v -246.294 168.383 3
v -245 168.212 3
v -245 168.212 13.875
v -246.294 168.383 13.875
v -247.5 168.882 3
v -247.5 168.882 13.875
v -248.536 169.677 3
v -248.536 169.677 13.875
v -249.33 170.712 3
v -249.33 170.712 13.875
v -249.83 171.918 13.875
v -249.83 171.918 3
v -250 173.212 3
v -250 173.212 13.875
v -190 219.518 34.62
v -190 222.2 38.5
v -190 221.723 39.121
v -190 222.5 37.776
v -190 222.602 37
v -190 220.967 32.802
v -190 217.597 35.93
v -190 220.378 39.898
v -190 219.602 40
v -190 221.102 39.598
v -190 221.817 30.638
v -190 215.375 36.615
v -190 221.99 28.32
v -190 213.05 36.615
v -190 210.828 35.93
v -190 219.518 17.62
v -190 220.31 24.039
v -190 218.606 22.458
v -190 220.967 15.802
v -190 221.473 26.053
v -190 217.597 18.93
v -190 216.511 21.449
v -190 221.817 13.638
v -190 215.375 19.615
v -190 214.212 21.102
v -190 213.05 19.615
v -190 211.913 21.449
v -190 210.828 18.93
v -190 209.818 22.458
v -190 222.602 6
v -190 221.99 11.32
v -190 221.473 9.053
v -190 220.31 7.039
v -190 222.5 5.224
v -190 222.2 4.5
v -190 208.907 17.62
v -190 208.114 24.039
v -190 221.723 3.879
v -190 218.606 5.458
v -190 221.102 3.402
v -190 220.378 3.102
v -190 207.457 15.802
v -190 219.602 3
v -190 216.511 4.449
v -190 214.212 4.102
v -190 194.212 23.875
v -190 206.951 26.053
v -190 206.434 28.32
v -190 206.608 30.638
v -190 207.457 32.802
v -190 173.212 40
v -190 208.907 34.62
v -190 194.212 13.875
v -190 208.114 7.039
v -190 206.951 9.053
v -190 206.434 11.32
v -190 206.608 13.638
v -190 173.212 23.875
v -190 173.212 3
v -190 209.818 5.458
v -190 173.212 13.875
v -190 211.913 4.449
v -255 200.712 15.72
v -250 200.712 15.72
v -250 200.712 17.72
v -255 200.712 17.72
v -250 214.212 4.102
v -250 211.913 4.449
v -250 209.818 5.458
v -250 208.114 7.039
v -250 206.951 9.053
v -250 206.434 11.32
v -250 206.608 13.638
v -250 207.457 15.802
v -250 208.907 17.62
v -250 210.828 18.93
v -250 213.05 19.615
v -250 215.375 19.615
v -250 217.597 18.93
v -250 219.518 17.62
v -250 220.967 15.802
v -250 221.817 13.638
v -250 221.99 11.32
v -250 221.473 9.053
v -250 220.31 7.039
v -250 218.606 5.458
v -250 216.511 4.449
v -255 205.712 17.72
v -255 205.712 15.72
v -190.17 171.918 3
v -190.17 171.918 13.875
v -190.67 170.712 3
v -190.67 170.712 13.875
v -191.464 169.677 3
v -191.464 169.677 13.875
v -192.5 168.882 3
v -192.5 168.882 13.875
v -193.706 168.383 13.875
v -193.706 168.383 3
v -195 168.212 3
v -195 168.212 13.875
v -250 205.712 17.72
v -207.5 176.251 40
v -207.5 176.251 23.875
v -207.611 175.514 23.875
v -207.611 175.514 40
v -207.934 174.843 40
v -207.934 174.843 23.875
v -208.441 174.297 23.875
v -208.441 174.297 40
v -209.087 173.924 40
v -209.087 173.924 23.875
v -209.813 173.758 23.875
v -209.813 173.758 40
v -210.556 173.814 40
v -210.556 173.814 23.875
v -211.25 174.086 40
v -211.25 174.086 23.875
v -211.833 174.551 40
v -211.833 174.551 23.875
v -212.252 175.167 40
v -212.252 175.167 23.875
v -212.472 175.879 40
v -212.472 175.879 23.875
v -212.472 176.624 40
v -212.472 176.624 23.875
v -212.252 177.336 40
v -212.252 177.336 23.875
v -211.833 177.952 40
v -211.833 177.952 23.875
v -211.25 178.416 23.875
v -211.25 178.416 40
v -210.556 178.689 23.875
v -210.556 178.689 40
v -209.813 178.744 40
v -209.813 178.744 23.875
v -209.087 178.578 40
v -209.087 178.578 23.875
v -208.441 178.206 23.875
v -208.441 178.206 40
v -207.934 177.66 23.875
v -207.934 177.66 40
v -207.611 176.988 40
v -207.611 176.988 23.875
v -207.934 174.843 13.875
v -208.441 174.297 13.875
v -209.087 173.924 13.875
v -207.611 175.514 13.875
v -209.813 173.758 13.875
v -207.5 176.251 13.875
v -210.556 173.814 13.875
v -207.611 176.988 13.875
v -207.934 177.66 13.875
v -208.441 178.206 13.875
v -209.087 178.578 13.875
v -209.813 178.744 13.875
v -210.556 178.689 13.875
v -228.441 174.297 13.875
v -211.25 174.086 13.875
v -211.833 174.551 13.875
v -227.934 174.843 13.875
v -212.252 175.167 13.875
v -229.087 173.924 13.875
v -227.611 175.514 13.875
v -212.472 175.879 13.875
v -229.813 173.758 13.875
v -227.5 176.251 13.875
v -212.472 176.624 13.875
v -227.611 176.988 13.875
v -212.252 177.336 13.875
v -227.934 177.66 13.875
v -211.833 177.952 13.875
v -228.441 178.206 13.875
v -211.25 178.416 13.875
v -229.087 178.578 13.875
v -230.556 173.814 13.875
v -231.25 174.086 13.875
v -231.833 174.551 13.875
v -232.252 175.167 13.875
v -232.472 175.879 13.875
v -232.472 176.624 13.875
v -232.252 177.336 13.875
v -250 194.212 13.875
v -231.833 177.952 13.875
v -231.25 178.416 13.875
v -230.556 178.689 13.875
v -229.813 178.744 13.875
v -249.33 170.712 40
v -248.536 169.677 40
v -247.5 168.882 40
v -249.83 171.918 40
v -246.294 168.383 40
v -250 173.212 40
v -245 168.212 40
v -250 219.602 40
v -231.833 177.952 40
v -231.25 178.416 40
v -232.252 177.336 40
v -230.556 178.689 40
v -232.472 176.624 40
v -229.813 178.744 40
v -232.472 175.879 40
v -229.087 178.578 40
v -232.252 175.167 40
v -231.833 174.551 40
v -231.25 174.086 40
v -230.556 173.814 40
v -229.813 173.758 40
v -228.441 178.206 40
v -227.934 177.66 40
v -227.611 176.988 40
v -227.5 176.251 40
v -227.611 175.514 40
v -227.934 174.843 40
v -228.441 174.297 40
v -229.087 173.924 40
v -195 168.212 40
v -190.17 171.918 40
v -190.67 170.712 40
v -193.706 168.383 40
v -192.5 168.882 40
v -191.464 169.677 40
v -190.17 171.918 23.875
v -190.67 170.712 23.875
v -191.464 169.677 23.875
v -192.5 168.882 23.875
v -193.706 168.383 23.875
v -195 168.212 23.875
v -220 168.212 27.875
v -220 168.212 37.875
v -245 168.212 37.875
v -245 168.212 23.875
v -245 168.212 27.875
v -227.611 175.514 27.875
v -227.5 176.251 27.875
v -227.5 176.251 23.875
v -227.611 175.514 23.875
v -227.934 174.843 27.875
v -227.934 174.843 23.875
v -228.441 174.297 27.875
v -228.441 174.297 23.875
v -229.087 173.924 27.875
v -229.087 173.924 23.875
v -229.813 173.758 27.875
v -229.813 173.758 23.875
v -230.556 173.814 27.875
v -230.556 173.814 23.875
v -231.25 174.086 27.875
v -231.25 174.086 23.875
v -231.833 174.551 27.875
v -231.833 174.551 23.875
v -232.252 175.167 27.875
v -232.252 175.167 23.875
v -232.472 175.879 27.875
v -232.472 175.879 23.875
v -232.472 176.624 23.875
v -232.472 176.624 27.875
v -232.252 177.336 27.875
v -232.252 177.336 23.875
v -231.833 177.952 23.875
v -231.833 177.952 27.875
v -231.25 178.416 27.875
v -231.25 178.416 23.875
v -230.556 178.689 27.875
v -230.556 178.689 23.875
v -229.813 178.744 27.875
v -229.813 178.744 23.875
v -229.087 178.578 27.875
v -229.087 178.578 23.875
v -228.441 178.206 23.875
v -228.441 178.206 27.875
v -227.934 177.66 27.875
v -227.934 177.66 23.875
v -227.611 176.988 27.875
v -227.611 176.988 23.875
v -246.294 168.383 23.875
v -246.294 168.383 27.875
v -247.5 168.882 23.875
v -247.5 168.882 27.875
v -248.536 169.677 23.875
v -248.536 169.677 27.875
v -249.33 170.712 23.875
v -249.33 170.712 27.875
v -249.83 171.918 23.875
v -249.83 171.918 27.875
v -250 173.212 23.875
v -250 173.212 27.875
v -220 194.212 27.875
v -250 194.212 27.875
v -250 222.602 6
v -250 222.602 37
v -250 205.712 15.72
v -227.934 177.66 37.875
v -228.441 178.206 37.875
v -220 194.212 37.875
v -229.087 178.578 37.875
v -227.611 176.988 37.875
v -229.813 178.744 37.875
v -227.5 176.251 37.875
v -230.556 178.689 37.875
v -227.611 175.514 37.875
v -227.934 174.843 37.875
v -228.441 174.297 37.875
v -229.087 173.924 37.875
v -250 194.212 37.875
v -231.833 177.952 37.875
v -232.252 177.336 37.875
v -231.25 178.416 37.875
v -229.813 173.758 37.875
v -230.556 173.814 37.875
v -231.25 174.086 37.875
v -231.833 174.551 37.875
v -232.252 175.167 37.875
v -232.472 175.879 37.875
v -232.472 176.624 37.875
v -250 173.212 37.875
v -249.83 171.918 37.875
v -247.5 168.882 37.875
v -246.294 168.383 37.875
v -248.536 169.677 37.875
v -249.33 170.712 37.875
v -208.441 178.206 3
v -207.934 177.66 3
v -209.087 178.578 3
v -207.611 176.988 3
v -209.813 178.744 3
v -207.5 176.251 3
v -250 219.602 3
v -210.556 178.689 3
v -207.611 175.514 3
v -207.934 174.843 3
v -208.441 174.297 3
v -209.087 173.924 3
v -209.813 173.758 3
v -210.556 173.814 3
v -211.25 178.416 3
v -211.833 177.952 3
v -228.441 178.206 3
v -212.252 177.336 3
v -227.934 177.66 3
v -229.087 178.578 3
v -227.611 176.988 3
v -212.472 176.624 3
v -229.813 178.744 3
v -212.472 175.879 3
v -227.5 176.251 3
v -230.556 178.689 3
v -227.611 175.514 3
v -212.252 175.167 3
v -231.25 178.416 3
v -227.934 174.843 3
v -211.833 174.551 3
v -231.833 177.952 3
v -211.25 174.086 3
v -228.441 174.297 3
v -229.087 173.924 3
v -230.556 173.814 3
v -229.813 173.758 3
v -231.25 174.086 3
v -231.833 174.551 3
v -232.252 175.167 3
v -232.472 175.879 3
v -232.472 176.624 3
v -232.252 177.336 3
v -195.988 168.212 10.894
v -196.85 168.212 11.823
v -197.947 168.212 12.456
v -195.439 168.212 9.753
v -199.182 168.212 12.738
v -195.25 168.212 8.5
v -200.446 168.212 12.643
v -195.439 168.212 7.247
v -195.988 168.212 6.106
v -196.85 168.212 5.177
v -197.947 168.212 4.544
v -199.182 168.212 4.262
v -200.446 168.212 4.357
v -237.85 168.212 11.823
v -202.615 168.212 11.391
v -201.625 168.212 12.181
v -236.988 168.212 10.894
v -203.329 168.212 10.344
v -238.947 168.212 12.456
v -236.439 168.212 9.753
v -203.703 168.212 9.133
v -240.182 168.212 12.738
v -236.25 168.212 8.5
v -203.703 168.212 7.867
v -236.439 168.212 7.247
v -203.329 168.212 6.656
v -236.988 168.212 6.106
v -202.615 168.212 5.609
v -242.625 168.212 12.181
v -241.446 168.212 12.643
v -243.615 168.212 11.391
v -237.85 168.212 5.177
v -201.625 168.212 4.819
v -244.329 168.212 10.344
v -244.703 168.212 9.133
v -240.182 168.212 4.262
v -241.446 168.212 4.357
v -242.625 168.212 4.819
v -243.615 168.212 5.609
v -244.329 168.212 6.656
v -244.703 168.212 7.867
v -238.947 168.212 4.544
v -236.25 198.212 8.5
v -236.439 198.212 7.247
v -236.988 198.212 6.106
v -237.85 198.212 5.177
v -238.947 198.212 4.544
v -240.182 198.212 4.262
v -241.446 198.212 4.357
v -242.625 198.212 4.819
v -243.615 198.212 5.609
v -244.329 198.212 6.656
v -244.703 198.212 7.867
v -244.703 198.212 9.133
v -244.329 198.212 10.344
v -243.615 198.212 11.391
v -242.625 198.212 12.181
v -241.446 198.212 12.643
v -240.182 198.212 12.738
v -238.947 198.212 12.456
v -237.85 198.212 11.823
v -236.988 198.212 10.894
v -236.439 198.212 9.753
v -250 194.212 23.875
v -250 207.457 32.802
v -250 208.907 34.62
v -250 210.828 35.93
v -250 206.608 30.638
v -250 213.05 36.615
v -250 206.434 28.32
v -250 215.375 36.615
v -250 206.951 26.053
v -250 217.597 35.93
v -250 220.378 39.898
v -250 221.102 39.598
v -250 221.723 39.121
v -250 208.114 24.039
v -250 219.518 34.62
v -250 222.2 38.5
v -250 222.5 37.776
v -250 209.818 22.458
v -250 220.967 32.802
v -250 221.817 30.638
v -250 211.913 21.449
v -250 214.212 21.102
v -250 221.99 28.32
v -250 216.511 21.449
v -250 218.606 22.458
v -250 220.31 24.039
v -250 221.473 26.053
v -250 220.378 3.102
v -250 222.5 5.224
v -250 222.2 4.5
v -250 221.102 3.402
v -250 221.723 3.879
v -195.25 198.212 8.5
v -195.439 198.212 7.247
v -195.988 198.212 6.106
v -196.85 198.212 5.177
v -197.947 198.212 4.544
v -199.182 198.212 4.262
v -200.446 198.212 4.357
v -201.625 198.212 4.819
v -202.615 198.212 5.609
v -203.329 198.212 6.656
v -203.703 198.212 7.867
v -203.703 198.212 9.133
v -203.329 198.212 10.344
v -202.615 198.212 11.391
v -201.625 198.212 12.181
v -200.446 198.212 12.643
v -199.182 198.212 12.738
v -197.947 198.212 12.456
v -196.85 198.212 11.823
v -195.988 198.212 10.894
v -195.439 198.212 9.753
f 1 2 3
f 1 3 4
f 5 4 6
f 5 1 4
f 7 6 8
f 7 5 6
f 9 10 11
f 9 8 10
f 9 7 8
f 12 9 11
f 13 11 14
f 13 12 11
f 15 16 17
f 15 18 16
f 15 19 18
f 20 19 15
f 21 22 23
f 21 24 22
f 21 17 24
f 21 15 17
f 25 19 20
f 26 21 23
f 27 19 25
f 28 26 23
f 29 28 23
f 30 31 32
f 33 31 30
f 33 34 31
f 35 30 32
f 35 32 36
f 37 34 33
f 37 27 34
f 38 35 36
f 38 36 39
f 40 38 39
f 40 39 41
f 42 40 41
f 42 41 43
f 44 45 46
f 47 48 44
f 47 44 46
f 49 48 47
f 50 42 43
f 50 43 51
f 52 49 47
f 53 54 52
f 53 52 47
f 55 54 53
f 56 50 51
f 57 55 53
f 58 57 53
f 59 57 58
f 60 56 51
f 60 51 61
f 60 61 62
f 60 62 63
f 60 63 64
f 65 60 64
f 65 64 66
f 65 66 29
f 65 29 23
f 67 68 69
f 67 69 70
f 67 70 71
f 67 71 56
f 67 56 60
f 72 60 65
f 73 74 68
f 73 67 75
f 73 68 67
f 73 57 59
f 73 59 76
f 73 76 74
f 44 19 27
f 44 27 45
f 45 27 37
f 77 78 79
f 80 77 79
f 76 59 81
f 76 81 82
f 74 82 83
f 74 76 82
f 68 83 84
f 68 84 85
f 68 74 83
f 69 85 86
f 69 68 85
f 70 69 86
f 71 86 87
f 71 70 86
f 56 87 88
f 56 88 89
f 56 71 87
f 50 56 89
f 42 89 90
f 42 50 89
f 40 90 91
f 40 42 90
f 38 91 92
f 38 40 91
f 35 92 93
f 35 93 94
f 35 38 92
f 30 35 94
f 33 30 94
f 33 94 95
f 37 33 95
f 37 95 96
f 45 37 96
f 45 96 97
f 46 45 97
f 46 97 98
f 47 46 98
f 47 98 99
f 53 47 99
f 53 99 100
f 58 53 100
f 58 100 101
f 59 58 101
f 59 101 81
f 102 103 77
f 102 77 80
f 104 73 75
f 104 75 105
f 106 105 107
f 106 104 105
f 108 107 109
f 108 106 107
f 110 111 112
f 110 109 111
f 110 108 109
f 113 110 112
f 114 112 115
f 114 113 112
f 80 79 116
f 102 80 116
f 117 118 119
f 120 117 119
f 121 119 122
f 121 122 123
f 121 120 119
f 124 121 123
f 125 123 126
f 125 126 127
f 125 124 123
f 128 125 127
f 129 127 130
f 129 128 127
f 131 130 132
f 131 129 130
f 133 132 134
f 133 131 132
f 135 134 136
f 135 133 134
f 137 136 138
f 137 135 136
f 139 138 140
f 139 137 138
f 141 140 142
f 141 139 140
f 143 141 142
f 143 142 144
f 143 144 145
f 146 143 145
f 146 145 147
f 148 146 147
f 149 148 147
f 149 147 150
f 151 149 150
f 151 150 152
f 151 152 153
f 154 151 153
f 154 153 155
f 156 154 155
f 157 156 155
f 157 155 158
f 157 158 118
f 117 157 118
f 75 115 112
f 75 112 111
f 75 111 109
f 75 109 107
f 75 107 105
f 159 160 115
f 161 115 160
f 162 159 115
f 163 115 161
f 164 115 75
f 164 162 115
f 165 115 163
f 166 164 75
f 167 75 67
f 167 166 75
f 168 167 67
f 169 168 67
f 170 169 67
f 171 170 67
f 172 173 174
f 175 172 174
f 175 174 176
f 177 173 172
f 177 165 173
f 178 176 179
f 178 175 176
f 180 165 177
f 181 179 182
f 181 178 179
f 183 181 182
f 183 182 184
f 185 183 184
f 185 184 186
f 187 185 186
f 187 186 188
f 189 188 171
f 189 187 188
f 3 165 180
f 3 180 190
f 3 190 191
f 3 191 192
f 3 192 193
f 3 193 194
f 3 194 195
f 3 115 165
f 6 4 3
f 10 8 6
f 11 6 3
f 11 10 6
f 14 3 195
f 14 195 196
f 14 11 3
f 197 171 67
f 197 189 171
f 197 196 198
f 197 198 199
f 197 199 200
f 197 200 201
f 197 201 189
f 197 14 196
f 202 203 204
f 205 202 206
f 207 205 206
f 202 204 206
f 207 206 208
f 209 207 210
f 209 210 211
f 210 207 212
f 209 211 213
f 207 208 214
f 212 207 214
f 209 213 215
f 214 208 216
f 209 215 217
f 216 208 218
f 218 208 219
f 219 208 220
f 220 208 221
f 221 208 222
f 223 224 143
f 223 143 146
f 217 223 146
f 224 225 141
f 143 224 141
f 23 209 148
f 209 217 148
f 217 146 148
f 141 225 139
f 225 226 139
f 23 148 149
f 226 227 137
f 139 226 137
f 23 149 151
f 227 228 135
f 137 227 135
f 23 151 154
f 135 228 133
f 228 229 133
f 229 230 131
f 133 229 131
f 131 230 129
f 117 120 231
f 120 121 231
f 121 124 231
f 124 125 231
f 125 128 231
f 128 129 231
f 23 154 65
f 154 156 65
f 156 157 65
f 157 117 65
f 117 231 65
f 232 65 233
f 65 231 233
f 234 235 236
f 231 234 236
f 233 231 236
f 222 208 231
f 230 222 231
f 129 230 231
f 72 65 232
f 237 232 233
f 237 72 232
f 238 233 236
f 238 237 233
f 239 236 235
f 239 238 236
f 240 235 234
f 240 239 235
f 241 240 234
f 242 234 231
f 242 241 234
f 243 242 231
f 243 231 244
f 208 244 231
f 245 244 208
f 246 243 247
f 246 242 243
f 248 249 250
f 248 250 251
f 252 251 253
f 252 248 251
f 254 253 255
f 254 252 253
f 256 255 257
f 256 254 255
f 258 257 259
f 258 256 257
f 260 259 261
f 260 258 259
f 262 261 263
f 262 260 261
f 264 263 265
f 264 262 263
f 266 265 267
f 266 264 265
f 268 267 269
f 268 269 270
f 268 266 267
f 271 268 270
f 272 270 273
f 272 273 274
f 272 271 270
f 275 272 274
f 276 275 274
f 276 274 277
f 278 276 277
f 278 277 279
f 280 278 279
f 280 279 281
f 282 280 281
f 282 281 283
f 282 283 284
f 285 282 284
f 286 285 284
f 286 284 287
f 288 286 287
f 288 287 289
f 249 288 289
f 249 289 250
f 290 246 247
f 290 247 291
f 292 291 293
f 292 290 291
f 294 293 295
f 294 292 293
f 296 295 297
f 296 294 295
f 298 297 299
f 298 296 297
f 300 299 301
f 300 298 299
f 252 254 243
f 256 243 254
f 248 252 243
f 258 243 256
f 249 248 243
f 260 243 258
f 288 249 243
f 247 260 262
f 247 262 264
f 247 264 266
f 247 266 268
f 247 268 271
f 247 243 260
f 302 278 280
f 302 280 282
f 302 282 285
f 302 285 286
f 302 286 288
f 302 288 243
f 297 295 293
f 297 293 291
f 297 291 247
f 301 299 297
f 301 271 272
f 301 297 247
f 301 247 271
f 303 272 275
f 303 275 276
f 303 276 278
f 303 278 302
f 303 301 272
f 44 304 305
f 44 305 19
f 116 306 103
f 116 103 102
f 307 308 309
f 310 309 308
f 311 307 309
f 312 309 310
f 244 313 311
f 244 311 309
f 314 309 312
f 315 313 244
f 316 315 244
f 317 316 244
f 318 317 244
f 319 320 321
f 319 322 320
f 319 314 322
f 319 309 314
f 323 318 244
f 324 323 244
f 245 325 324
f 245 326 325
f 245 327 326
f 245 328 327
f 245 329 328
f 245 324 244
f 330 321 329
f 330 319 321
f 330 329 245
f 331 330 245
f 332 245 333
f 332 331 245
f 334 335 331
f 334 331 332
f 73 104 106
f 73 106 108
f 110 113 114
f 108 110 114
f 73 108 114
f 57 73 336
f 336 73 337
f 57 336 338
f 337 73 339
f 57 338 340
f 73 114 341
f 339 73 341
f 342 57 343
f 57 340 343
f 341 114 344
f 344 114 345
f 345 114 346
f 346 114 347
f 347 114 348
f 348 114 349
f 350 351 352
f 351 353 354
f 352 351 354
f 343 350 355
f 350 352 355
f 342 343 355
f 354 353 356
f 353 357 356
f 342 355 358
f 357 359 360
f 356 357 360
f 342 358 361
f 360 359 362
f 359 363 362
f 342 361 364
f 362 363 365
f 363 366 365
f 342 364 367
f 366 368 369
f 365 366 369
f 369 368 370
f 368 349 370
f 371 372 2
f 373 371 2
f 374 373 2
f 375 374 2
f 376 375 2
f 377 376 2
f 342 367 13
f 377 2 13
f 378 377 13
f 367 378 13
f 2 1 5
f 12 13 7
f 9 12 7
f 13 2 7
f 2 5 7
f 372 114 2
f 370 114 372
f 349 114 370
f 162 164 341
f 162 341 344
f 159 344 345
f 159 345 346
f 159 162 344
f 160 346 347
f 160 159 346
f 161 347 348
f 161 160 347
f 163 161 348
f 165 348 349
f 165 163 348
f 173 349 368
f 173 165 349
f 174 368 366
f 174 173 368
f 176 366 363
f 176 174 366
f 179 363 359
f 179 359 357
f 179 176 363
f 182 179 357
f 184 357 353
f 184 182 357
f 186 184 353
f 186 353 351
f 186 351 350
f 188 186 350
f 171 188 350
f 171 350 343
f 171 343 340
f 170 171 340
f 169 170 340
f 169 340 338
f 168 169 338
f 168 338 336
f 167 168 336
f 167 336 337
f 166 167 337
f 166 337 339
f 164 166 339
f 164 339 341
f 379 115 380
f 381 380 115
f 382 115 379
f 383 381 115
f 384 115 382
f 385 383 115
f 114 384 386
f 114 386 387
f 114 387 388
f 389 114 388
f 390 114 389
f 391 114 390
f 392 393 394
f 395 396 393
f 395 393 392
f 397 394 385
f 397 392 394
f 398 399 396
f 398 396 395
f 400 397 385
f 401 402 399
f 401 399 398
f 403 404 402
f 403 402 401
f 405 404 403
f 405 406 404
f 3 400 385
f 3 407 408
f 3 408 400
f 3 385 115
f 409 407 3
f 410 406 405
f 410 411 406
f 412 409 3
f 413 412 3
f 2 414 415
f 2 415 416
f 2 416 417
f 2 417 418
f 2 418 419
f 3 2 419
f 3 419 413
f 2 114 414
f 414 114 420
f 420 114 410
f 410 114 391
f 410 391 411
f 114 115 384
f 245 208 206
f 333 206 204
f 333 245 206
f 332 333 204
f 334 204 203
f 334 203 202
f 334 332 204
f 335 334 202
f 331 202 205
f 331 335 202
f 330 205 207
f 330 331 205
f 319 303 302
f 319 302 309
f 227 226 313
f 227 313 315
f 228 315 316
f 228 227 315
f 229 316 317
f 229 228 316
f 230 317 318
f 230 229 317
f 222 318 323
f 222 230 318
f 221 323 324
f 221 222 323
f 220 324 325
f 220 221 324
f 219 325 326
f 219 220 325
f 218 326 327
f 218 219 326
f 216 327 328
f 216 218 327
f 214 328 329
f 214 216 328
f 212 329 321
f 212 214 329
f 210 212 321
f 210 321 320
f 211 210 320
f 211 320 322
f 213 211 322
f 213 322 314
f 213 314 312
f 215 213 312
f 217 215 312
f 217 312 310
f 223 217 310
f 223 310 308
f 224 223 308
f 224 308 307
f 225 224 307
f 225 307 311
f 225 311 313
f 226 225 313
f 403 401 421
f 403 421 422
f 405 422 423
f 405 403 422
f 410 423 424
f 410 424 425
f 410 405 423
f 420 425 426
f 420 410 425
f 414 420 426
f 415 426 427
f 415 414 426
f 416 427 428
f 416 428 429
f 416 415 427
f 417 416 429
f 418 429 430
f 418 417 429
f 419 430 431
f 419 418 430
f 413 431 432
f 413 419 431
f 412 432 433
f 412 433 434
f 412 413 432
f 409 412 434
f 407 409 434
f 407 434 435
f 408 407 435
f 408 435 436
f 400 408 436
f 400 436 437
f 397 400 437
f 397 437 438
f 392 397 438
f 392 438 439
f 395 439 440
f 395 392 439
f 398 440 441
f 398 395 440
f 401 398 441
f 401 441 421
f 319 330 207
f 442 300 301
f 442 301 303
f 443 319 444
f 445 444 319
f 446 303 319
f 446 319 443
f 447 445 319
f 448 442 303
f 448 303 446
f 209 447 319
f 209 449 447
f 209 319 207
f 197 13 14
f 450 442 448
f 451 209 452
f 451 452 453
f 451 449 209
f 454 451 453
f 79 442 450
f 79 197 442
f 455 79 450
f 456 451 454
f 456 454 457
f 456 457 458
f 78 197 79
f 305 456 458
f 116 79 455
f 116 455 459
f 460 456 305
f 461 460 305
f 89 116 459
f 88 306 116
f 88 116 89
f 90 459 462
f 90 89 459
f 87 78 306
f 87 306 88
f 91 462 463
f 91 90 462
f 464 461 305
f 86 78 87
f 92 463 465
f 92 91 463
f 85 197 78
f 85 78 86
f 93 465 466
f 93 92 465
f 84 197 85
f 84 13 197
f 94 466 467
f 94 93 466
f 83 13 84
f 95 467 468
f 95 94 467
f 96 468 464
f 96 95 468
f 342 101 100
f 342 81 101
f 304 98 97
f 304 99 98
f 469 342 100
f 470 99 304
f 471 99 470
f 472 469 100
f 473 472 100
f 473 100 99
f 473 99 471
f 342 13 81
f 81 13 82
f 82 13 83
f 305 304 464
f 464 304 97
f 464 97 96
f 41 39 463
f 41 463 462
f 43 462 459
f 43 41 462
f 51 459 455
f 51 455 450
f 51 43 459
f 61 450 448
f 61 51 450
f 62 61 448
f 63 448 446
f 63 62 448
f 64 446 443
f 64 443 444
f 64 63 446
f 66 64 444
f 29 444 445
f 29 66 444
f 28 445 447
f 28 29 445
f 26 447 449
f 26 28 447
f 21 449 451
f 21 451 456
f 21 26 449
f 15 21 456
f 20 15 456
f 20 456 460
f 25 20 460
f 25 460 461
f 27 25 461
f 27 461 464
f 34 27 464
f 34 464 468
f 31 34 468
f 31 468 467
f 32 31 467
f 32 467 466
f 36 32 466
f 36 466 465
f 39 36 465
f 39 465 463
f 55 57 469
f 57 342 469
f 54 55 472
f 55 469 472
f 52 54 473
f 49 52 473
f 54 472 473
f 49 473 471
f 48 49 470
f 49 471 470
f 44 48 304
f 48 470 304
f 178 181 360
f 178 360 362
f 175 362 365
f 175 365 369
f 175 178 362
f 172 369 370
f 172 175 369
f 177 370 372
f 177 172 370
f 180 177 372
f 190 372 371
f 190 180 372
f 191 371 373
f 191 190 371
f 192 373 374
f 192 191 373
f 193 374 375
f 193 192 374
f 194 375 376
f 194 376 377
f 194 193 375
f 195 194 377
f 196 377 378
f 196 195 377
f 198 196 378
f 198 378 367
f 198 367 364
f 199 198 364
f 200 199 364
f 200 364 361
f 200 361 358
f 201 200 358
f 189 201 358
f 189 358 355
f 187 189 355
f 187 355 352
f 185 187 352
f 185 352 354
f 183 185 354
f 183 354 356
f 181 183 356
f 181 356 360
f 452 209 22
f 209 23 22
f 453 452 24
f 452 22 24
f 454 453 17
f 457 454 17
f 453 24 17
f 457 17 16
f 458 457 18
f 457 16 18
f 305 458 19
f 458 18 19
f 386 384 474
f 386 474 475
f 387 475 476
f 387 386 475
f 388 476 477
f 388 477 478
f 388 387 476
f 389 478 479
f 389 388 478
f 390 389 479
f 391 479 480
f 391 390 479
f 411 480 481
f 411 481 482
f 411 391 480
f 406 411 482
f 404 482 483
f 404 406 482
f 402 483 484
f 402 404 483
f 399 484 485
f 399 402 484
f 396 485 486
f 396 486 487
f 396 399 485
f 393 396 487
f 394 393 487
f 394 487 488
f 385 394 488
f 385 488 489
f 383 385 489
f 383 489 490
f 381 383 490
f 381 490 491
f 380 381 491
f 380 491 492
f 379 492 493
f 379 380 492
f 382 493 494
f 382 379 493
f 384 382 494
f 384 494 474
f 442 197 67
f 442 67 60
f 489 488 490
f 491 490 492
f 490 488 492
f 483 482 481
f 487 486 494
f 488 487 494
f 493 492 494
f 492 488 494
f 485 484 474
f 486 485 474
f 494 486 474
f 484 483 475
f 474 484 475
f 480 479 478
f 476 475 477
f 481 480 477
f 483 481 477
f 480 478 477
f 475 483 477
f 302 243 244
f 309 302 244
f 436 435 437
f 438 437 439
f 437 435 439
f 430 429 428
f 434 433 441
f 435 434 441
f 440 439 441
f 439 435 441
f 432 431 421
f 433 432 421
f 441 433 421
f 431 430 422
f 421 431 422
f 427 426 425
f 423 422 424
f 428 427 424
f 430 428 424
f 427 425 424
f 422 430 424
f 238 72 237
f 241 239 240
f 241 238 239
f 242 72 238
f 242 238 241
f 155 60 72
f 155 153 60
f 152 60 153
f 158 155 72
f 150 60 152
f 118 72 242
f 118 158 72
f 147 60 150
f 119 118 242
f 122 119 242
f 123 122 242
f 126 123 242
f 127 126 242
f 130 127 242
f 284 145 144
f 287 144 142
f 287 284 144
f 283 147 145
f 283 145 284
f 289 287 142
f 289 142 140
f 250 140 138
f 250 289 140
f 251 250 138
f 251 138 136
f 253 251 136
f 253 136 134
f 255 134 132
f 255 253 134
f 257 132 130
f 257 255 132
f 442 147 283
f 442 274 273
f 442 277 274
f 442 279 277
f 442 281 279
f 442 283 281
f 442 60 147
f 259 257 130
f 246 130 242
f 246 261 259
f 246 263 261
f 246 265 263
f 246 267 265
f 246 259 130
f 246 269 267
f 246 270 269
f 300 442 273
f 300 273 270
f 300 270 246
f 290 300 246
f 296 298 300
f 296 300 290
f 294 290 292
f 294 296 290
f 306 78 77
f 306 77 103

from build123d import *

# Parameters (mm, degrees)
RESSALTO_EXTRUS_O1_DEPTH = 40
ESBO_O4_R                = 7.8
CORTE_EXTRUS_O1_DEPTH    = 61
CORTE_EXTRUS_O2_DEPTH    = 3
FILETE2_R                = 3
CORTE_EXTRUS_O5_DEPTH    = 61
ESBO_O10_R               = 2.5
CORTE_EXTRUS_O6_DEPTH    = 38
ESBO_O11_R               = 4.25
CORTE_EXTRUS_O7_DEPTH    = 30
CORTE_EXTRUS_O8_DEPTH    = 30
ESBO_O13_W               = 2
ESBO_O13_H               = 5
RESSALTO_EXTRUS_O2_DEPTH = 5


with BuildPart() as part:
    # Esboço2 → Ressalto-extrusão1 (new body)
    with BuildSketch(Plane.XY):
        with BuildLine():
            Line((-246.218768802, 113.822486613), (-237.781231198, 113.822486613))
            Line((-237.781231198, 113.822486613), (-201.966801004, 113.822486613))
            Line((-201.966801004, 113.822486613), (-194.033198996, 113.822486613))
            Line((-194.033198996, 113.822486613), (-190, 113.822486613))
            Line((-190, 113.822486613), (-190, 138.123568891))
            Line((-190, 138.123568891), (-190, 163.212189341))
            ThreePointArc((-190, 163.212189341), (-191.464466094, 166.747723246), (-195, 168.212189341))
            Line((-195, 168.212189341), (-245, 168.212189341))
            ThreePointArc((-245, 168.212189341), (-248.535533906, 166.747723246), (-250, 163.212189341))
            Line((-250, 163.212189341), (-250, 138.123568891))
            Line((-250, 138.123568891), (-250, 113.822486613))
            Line((-250, 113.822486613), (-246.218768802, 113.822486613))
        make_face()
    extrude(amount=RESSALTO_EXTRUS_O1_DEPTH)

    # Esboço4 → Corte-extrusão1 (cut, through all)
    with BuildSketch(Plane(origin=(-190, 0, 0), x_dir=(0, 0, -1), z_dir=(1, 0, 0))):
        with Locations((-11.90241208, 122.212171493)):
            Circle(ESBO_O4_R)
        with Locations((-28.90241208, 122.212171493)):
            Circle(ESBO_O4_R)
    extrude(amount=-CORTE_EXTRUS_O1_DEPTH, mode=Mode.SUBTRACT)

    # Esboço5 → Corte-extrusão2 (cut)
    with BuildSketch(Plane(origin=(0, 0, 0), x_dir=(-1, 0, 0), z_dir=(0, 0, -1))):
        with BuildLine():
            Line((190, 163.212189341), (190, 113.822486613))
            Line((190, 113.822486613), (250, 113.822486613))
            Line((250, 113.822486613), (250, 163.212189341))
            ThreePointArc((250, 163.212189341), (248.535533906, 166.747723246), (245, 168.212189341))
            Line((245, 168.212189341), (195, 168.212189341))
            ThreePointArc((195, 168.212189341), (191.464466094, 166.747723246), (190, 163.212189341))
        make_face()
    extrude(amount=-CORTE_EXTRUS_O2_DEPTH, mode=Mode.SUBTRACT)

    # Filete2
    filete2_edges = [part.edges().sort_by_distance(p)[0] for p in [
        (-220, 113.822486613, 40),
        (-220, 113.822486613, 3),
    ]]
    fillet(filete2_edges, radius=FILETE2_R)

    # Esboço8 → Corte-extrusão5 (cut, through all)
    with BuildSketch(Plane.ZY.offset(250)):
        Polygon((23.874860756, 142.212171493), (23.874860756, 152.212171493), (23.874860756, 182.191519565), (13.874860756, 182.191519565), (13.874860756, 152.212171493), (13.874860756, 142.212171493), align=None)
    extrude(amount=-CORTE_EXTRUS_O5_DEPTH, mode=Mode.SUBTRACT)

    # Esboço10 → Corte-extrusão6 (cut, through all)
    with BuildSketch(Plane.XY.offset(40)):
        with Locations((-210, 160.173107934)):
            Circle(ESBO_O10_R)
        with Locations((-230, 160.173107934)):
            Circle(ESBO_O10_R)
    extrude(amount=-CORTE_EXTRUS_O6_DEPTH, mode=Mode.SUBTRACT)

    # Esboço11 → Corte-extrusão7 (cut)
    with BuildSketch(Plane(origin=(0, 168.212189341, 0), x_dir=(1, 0, 0), z_dir=(0, 1, 0))):
        with Locations((-199.5, -8.5)):
            Circle(ESBO_O11_R)
        with Locations((-240.5, -8.5)):
            Circle(ESBO_O11_R)
    extrude(amount=-CORTE_EXTRUS_O7_DEPTH, mode=Mode.SUBTRACT)

    # Esboço12 → Corte-extrusão8 (cut)
    with BuildSketch(Plane.ZY.offset(250)):
        Polygon((27.874860756, 152.212171493), (27.874860756, 142.212171493), (37.874860756, 142.212171493), (37.874860756, 152.212171493), (37.874860756, 170.639409053), (27.874860756, 170.639409053), align=None)
    extrude(amount=-CORTE_EXTRUS_O8_DEPTH, mode=Mode.SUBTRACT)


with BuildPart() as body_2:
    # Espelhar1: mirrored copy
    add(part.part.mirror(Plane(origin=(-245, 168.212189341, 40), x_dir=(0, 0, 1), z_dir=(0, -1, 0))))

    # Esboço13 → Ressalto-extrusão2 (add)
    with BuildSketch(Plane.ZY.offset(250)):
        with Locations((16.72, 203.212207189)):
            Rectangle(ESBO_O13_W, ESBO_O13_H)
    extrude(amount=RESSALTO_EXTRUS_O2_DEPTH)


solid = body_2.part
